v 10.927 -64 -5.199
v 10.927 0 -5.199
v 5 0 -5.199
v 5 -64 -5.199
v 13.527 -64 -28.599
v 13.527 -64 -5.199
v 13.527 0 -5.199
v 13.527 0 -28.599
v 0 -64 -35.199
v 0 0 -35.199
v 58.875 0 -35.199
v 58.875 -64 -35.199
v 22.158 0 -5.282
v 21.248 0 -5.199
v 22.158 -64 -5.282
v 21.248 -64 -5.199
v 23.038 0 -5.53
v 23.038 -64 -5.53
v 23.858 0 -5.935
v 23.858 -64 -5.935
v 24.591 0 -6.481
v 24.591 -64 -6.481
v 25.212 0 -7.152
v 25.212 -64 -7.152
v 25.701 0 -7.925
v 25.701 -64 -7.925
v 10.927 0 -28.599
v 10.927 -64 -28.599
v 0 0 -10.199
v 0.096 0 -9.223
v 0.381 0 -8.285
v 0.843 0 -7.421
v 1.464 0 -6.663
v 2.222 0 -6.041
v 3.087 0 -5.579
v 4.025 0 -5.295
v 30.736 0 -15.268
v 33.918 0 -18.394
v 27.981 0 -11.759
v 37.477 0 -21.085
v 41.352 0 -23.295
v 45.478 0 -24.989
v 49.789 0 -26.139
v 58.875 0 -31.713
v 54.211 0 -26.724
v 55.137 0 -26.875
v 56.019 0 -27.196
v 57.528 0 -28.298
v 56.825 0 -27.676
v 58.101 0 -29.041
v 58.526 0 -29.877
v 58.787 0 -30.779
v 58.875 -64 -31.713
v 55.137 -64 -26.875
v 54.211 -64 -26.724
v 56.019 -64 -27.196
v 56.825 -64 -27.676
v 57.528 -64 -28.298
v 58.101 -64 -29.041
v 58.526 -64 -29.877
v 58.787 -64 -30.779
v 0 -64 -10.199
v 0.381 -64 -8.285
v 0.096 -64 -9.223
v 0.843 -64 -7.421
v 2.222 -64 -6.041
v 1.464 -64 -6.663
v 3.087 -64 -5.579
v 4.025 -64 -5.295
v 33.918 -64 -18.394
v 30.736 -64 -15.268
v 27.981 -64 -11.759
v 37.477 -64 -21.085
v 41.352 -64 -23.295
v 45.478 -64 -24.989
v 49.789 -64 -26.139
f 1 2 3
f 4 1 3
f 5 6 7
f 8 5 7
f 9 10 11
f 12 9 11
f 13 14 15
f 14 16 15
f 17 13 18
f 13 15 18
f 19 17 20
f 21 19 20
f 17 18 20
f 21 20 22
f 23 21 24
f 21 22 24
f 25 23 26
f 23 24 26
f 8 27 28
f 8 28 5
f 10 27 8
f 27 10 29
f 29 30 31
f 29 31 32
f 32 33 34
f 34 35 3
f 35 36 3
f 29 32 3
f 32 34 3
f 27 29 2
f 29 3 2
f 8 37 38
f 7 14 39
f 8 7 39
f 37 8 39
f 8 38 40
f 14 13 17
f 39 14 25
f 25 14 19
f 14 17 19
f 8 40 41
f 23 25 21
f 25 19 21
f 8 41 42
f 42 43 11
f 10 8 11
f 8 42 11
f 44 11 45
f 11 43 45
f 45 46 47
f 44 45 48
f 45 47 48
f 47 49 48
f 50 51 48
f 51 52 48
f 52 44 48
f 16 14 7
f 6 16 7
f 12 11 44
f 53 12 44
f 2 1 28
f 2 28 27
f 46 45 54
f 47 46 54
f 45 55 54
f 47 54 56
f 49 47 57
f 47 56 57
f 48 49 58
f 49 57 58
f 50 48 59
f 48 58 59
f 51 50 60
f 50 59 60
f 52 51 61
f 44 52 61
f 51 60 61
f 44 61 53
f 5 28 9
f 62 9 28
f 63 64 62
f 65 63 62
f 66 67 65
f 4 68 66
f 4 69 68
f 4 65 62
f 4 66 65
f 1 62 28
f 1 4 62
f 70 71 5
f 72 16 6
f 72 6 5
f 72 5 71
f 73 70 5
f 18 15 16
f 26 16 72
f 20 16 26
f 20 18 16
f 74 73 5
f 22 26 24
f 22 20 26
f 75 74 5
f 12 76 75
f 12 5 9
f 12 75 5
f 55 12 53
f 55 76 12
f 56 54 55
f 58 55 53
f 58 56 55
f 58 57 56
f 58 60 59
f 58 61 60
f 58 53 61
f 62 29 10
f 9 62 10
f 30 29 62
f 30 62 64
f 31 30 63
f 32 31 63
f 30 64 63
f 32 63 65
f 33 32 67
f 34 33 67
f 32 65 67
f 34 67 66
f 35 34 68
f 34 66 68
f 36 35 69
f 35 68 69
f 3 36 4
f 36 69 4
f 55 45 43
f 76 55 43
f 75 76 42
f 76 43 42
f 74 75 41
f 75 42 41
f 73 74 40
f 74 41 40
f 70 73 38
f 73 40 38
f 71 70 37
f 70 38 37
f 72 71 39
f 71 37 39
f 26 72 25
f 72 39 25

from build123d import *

# Parameters (mm, degrees)
F1_DEPTH = 64
F2_W     = 2.6
F2_H     = 64
F3_DEPTH = 23.4
F4_R     = 5


with BuildPart() as f1:
    # F0 (on Front) → F1 (new body)
    with BuildSketch(Plane.XZ):
        with BuildLine():
            Line((24.4545675814, -5.1988300681), (0, -5.1988300681))
            Line((0, -5.1988300681), (0, -35.1988300681))
            Line((0, -35.1988300681), (58.8754676282, -35.1988300681))
            Line((58.8754676282, -35.1988300681), (58.8754676282, -26.7230011523))
            ThreePointArc((58.8754676282, -26.7230011523), (38.1790837444, -21.5355312603), (24.4545675814, -5.1988300681))
        make_face()
    extrude(amount=F1_DEPTH)

    # F2 (on face) → F3 (cut)
    with BuildSketch(Plane.XY.offset(-5.1988300681)):
        with Locations((12.2272837907, -32)):
            Rectangle(F2_W, F2_H)
    extrude(amount=-F3_DEPTH, mode=Mode.SUBTRACT)

    # F4
    f4_edges = [f1.edges().sort_by_distance(p)[0] for p in [
        (24.454568, -32, -5.19883),
        (0, -32, -5.19883),
        (58.875468, -32, -26.723001),
    ]]
    fillet(f4_edges, radius=F4_R)


solid = f1.part
